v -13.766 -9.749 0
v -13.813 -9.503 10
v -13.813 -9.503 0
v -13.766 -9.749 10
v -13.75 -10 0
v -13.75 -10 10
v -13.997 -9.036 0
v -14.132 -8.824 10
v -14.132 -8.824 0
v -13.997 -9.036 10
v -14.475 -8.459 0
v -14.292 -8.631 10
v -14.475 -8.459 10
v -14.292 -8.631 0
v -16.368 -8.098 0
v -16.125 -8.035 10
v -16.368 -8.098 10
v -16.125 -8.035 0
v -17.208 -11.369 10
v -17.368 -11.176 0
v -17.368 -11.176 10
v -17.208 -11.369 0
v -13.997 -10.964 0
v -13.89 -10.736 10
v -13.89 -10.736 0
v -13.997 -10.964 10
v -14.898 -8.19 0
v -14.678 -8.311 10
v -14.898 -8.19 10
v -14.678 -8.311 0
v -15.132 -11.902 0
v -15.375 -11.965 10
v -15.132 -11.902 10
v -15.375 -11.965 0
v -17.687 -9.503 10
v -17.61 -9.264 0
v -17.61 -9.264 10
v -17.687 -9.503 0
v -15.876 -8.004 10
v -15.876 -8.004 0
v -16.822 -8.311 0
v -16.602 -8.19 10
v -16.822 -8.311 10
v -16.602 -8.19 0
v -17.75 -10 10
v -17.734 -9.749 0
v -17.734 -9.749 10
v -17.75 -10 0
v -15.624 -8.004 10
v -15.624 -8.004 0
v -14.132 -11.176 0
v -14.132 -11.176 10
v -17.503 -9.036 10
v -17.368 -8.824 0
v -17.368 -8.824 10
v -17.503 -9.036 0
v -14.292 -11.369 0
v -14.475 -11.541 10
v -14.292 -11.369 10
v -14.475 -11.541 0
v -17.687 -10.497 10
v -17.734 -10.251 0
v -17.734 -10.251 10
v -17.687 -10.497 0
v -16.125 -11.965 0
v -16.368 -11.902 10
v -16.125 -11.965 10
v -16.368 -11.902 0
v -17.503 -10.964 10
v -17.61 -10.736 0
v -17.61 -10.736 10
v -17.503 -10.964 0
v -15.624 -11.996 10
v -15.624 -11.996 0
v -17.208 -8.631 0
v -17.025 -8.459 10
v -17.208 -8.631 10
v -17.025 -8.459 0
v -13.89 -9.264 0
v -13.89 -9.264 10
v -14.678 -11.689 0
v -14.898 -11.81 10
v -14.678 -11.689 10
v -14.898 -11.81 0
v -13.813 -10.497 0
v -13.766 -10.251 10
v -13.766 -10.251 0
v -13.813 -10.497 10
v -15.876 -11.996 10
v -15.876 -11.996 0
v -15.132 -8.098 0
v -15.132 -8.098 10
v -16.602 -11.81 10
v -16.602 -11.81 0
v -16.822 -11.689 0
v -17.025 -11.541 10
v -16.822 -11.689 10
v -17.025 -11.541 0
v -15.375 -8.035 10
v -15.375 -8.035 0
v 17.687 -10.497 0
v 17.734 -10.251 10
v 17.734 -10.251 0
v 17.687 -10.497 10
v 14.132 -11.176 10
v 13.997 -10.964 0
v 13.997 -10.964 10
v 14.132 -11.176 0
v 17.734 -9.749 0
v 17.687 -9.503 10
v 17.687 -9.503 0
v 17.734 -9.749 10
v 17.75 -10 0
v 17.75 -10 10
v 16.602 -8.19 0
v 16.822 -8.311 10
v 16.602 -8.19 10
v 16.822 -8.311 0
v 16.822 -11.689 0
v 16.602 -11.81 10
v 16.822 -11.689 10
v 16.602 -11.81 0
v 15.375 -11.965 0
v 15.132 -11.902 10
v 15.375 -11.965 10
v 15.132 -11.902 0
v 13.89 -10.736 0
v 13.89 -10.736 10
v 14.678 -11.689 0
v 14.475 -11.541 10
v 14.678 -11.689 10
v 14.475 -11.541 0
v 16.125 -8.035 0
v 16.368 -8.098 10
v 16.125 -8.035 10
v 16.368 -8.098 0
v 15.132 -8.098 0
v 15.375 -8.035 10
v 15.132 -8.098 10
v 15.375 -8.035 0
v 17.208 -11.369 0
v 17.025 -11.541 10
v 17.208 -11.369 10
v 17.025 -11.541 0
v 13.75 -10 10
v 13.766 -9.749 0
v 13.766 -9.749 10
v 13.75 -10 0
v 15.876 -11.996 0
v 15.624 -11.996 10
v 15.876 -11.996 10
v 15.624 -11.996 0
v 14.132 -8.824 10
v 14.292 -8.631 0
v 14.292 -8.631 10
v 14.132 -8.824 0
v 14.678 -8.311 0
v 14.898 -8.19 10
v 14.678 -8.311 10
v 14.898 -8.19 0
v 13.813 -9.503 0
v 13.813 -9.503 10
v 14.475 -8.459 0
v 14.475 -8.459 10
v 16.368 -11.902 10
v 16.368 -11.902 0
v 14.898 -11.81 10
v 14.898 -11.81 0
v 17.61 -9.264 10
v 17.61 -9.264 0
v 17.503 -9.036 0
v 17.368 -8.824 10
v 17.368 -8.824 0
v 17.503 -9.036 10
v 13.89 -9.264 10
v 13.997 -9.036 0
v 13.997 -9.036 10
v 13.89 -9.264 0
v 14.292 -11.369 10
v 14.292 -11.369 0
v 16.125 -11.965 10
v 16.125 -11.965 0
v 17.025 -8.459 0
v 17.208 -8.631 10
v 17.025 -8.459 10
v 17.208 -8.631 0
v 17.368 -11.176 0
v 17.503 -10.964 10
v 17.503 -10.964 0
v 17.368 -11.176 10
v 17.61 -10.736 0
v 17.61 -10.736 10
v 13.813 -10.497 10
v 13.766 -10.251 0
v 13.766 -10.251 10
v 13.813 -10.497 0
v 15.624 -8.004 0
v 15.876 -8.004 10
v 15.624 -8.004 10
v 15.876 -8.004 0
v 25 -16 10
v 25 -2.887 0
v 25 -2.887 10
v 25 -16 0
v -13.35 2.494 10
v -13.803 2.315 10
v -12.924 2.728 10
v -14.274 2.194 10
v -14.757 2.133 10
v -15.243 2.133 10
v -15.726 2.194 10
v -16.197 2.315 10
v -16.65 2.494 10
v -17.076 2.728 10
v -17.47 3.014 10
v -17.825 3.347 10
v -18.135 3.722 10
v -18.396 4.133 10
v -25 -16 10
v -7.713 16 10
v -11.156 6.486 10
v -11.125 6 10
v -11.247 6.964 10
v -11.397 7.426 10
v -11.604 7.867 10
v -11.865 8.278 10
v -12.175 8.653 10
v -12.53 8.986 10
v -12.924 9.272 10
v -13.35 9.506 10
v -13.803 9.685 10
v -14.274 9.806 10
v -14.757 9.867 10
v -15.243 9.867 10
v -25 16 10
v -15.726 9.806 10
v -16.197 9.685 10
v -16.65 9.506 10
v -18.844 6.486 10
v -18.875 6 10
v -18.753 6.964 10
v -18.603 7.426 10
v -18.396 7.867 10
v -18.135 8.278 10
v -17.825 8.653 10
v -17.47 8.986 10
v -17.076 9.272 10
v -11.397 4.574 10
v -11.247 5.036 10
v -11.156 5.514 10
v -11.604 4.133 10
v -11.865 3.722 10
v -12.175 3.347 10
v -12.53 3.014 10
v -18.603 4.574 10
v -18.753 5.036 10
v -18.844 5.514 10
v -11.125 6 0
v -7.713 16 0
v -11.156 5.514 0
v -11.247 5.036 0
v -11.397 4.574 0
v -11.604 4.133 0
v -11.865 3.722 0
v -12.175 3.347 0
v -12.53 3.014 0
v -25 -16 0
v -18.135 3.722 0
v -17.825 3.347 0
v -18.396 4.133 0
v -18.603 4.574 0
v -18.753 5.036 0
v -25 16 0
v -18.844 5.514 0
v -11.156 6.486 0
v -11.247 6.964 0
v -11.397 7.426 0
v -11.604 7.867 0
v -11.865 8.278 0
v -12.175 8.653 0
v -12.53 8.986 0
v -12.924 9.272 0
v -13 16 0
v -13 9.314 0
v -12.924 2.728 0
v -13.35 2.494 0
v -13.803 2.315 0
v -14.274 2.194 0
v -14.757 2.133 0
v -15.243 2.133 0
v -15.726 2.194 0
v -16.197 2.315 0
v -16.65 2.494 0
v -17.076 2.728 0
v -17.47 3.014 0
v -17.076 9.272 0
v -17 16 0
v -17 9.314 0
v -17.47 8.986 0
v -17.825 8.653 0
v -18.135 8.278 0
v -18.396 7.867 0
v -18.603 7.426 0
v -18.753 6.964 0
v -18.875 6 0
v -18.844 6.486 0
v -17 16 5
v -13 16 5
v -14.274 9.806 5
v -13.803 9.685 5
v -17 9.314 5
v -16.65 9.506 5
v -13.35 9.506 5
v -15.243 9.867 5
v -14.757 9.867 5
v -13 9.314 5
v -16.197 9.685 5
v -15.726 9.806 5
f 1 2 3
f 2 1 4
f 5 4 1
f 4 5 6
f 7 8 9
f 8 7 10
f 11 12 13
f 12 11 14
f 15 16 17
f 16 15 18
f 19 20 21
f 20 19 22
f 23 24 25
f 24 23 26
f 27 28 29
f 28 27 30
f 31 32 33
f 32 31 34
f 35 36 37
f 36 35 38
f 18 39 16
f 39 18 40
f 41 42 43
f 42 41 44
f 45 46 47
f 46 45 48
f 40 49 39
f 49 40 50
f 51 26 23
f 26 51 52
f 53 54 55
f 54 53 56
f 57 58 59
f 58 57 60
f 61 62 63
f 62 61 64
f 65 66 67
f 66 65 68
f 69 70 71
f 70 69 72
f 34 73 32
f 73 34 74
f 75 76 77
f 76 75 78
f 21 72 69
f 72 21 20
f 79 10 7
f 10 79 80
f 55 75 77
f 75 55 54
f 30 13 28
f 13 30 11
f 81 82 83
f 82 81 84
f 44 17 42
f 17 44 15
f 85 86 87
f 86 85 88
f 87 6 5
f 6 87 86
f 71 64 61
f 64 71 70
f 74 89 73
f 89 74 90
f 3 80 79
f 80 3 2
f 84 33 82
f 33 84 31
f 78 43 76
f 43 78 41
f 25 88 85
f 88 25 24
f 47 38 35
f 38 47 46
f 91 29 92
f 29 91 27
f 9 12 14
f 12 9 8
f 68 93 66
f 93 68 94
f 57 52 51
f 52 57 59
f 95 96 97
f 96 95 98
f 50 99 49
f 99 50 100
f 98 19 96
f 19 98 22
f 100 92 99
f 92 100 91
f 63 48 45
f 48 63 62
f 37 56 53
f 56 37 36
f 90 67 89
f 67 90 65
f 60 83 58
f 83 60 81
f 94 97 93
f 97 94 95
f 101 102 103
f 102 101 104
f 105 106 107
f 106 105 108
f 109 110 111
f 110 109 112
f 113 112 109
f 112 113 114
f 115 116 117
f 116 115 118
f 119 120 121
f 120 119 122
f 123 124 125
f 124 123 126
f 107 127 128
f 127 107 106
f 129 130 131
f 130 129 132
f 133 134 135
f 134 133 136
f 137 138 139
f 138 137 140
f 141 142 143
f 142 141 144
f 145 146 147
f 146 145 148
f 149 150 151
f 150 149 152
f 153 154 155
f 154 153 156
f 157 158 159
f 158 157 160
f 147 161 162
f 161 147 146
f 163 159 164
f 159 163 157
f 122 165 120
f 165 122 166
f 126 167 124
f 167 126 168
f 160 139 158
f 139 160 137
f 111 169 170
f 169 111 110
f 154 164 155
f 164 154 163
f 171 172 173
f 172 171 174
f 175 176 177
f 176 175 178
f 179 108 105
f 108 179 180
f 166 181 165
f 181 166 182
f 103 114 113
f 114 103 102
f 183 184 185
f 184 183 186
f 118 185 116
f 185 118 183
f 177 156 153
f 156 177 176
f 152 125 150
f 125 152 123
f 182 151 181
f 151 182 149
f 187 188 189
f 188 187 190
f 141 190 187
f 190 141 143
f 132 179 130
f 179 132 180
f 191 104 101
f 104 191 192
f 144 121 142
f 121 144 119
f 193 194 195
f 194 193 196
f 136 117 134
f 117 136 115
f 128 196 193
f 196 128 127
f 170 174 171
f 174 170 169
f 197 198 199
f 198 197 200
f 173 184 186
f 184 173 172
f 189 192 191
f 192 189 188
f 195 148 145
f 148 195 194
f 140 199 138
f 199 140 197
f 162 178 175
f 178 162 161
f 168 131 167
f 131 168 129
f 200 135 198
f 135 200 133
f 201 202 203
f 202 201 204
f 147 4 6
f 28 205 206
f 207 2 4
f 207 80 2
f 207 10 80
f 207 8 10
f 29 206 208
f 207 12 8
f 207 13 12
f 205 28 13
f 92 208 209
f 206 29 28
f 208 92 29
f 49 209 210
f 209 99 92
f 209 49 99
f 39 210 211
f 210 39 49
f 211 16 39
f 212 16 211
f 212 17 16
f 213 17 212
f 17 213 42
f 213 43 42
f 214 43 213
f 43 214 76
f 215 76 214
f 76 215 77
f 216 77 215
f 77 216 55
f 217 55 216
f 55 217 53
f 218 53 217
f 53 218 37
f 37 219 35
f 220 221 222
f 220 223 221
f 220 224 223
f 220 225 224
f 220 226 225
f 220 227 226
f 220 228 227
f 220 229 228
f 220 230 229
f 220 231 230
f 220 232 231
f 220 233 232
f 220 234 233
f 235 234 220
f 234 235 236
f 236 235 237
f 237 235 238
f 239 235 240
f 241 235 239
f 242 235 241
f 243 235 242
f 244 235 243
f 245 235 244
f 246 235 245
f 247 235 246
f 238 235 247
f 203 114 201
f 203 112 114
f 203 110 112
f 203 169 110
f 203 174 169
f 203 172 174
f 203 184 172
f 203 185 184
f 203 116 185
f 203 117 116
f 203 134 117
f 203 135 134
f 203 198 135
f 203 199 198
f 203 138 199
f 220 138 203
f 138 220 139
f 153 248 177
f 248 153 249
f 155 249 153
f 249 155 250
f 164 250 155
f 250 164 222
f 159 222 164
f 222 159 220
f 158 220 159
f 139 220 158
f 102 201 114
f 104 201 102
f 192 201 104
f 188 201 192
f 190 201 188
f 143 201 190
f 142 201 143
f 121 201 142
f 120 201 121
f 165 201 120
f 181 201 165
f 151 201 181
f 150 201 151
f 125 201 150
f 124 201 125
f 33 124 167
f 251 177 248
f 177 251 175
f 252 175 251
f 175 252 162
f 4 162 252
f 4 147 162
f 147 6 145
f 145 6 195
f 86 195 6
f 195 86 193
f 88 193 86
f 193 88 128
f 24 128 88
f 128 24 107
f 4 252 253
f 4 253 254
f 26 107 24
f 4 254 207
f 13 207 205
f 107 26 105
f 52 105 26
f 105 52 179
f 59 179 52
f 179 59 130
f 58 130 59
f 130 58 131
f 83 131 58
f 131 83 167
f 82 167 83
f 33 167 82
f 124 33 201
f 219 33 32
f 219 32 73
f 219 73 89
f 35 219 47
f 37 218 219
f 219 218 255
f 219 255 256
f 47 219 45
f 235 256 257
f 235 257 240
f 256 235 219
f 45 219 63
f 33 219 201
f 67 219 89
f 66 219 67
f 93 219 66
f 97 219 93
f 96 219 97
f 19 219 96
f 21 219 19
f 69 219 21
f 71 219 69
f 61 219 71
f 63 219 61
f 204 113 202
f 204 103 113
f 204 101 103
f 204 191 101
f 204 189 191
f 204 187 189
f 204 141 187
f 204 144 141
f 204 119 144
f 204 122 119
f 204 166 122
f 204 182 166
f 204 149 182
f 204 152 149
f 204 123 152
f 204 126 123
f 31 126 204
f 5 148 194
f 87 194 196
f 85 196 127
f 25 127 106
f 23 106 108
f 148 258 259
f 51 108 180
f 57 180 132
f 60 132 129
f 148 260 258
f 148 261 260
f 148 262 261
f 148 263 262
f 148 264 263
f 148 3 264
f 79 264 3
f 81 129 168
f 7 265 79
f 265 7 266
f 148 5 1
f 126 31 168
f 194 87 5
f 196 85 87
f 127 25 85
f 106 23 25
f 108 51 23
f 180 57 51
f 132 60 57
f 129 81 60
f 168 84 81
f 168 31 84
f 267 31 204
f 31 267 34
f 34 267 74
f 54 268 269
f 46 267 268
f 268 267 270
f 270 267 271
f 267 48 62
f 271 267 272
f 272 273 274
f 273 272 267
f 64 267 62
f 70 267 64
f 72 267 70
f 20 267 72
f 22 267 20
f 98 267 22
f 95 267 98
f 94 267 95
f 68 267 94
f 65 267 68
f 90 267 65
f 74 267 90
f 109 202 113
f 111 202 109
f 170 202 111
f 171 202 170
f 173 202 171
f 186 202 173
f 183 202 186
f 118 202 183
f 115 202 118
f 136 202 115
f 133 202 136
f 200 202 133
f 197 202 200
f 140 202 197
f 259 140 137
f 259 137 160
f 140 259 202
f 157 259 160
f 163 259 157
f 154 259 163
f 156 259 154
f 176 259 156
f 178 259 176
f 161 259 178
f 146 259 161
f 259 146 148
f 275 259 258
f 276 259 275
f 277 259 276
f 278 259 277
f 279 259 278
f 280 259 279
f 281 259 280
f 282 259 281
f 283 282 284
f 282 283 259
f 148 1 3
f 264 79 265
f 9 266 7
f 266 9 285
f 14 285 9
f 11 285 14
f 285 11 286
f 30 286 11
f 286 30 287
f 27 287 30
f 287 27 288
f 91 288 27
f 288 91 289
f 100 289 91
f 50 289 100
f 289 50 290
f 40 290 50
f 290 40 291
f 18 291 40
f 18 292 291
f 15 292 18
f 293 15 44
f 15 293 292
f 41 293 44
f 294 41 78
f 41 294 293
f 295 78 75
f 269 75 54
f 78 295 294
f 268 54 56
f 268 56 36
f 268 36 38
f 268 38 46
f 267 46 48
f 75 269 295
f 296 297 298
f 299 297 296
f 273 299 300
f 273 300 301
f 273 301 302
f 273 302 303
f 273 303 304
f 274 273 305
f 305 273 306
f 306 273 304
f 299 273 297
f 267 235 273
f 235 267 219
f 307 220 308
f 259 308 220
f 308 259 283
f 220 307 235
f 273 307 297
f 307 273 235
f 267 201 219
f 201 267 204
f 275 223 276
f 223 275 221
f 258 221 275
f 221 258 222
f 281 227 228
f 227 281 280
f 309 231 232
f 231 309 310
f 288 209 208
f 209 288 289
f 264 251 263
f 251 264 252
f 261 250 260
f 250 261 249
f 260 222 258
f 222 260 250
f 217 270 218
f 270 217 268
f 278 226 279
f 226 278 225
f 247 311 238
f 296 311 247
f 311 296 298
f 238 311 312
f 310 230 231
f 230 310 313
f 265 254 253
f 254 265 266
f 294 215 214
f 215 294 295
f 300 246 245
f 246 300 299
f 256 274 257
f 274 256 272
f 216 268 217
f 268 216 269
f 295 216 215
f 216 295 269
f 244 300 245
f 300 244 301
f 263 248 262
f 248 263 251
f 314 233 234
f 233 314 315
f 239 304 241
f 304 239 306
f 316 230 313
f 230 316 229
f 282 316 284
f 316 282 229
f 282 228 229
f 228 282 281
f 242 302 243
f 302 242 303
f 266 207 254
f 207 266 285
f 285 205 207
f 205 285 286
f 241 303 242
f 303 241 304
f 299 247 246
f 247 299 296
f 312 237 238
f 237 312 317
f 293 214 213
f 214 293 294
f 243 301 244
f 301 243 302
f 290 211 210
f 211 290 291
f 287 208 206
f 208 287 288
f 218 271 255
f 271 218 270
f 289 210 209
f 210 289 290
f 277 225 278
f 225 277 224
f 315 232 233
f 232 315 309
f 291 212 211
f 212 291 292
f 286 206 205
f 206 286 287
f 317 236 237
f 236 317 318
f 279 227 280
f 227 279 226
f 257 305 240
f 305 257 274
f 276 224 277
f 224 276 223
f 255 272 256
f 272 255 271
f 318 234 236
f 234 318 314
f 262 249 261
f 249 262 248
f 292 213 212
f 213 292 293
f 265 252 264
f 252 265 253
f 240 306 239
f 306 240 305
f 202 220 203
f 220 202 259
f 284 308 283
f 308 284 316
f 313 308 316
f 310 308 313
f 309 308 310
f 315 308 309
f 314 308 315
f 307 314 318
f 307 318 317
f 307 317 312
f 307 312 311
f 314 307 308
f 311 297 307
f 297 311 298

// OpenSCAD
$fn=50;

w=50;
l=32;
h=10;
x_offset=-15;
y_offset=6;

difference() {
  translate([-w/2,-l/2,0]) cube([w,l,h]);
  translate([x_offset,y_offset,0]) translate([0,0,-0.1]) cylinder(d=7.75, h=h+0.2);
  
  translate([-31.5/2,-10,0]) {
    translate([0,0,-0.1]) cylinder(d=4, h=h+0.2);
    translate([31.5,0,-0.1]) cylinder(d=4, h=h+0.2);
  }
  
  rotate([0,0,-30]) translate([-50,10,-0.1]) cube([100,100,h+0.2]);
  
  translate([x_offset-2, y_offset,-0.1]) cube([4,12,h/2+0.1]);
}
